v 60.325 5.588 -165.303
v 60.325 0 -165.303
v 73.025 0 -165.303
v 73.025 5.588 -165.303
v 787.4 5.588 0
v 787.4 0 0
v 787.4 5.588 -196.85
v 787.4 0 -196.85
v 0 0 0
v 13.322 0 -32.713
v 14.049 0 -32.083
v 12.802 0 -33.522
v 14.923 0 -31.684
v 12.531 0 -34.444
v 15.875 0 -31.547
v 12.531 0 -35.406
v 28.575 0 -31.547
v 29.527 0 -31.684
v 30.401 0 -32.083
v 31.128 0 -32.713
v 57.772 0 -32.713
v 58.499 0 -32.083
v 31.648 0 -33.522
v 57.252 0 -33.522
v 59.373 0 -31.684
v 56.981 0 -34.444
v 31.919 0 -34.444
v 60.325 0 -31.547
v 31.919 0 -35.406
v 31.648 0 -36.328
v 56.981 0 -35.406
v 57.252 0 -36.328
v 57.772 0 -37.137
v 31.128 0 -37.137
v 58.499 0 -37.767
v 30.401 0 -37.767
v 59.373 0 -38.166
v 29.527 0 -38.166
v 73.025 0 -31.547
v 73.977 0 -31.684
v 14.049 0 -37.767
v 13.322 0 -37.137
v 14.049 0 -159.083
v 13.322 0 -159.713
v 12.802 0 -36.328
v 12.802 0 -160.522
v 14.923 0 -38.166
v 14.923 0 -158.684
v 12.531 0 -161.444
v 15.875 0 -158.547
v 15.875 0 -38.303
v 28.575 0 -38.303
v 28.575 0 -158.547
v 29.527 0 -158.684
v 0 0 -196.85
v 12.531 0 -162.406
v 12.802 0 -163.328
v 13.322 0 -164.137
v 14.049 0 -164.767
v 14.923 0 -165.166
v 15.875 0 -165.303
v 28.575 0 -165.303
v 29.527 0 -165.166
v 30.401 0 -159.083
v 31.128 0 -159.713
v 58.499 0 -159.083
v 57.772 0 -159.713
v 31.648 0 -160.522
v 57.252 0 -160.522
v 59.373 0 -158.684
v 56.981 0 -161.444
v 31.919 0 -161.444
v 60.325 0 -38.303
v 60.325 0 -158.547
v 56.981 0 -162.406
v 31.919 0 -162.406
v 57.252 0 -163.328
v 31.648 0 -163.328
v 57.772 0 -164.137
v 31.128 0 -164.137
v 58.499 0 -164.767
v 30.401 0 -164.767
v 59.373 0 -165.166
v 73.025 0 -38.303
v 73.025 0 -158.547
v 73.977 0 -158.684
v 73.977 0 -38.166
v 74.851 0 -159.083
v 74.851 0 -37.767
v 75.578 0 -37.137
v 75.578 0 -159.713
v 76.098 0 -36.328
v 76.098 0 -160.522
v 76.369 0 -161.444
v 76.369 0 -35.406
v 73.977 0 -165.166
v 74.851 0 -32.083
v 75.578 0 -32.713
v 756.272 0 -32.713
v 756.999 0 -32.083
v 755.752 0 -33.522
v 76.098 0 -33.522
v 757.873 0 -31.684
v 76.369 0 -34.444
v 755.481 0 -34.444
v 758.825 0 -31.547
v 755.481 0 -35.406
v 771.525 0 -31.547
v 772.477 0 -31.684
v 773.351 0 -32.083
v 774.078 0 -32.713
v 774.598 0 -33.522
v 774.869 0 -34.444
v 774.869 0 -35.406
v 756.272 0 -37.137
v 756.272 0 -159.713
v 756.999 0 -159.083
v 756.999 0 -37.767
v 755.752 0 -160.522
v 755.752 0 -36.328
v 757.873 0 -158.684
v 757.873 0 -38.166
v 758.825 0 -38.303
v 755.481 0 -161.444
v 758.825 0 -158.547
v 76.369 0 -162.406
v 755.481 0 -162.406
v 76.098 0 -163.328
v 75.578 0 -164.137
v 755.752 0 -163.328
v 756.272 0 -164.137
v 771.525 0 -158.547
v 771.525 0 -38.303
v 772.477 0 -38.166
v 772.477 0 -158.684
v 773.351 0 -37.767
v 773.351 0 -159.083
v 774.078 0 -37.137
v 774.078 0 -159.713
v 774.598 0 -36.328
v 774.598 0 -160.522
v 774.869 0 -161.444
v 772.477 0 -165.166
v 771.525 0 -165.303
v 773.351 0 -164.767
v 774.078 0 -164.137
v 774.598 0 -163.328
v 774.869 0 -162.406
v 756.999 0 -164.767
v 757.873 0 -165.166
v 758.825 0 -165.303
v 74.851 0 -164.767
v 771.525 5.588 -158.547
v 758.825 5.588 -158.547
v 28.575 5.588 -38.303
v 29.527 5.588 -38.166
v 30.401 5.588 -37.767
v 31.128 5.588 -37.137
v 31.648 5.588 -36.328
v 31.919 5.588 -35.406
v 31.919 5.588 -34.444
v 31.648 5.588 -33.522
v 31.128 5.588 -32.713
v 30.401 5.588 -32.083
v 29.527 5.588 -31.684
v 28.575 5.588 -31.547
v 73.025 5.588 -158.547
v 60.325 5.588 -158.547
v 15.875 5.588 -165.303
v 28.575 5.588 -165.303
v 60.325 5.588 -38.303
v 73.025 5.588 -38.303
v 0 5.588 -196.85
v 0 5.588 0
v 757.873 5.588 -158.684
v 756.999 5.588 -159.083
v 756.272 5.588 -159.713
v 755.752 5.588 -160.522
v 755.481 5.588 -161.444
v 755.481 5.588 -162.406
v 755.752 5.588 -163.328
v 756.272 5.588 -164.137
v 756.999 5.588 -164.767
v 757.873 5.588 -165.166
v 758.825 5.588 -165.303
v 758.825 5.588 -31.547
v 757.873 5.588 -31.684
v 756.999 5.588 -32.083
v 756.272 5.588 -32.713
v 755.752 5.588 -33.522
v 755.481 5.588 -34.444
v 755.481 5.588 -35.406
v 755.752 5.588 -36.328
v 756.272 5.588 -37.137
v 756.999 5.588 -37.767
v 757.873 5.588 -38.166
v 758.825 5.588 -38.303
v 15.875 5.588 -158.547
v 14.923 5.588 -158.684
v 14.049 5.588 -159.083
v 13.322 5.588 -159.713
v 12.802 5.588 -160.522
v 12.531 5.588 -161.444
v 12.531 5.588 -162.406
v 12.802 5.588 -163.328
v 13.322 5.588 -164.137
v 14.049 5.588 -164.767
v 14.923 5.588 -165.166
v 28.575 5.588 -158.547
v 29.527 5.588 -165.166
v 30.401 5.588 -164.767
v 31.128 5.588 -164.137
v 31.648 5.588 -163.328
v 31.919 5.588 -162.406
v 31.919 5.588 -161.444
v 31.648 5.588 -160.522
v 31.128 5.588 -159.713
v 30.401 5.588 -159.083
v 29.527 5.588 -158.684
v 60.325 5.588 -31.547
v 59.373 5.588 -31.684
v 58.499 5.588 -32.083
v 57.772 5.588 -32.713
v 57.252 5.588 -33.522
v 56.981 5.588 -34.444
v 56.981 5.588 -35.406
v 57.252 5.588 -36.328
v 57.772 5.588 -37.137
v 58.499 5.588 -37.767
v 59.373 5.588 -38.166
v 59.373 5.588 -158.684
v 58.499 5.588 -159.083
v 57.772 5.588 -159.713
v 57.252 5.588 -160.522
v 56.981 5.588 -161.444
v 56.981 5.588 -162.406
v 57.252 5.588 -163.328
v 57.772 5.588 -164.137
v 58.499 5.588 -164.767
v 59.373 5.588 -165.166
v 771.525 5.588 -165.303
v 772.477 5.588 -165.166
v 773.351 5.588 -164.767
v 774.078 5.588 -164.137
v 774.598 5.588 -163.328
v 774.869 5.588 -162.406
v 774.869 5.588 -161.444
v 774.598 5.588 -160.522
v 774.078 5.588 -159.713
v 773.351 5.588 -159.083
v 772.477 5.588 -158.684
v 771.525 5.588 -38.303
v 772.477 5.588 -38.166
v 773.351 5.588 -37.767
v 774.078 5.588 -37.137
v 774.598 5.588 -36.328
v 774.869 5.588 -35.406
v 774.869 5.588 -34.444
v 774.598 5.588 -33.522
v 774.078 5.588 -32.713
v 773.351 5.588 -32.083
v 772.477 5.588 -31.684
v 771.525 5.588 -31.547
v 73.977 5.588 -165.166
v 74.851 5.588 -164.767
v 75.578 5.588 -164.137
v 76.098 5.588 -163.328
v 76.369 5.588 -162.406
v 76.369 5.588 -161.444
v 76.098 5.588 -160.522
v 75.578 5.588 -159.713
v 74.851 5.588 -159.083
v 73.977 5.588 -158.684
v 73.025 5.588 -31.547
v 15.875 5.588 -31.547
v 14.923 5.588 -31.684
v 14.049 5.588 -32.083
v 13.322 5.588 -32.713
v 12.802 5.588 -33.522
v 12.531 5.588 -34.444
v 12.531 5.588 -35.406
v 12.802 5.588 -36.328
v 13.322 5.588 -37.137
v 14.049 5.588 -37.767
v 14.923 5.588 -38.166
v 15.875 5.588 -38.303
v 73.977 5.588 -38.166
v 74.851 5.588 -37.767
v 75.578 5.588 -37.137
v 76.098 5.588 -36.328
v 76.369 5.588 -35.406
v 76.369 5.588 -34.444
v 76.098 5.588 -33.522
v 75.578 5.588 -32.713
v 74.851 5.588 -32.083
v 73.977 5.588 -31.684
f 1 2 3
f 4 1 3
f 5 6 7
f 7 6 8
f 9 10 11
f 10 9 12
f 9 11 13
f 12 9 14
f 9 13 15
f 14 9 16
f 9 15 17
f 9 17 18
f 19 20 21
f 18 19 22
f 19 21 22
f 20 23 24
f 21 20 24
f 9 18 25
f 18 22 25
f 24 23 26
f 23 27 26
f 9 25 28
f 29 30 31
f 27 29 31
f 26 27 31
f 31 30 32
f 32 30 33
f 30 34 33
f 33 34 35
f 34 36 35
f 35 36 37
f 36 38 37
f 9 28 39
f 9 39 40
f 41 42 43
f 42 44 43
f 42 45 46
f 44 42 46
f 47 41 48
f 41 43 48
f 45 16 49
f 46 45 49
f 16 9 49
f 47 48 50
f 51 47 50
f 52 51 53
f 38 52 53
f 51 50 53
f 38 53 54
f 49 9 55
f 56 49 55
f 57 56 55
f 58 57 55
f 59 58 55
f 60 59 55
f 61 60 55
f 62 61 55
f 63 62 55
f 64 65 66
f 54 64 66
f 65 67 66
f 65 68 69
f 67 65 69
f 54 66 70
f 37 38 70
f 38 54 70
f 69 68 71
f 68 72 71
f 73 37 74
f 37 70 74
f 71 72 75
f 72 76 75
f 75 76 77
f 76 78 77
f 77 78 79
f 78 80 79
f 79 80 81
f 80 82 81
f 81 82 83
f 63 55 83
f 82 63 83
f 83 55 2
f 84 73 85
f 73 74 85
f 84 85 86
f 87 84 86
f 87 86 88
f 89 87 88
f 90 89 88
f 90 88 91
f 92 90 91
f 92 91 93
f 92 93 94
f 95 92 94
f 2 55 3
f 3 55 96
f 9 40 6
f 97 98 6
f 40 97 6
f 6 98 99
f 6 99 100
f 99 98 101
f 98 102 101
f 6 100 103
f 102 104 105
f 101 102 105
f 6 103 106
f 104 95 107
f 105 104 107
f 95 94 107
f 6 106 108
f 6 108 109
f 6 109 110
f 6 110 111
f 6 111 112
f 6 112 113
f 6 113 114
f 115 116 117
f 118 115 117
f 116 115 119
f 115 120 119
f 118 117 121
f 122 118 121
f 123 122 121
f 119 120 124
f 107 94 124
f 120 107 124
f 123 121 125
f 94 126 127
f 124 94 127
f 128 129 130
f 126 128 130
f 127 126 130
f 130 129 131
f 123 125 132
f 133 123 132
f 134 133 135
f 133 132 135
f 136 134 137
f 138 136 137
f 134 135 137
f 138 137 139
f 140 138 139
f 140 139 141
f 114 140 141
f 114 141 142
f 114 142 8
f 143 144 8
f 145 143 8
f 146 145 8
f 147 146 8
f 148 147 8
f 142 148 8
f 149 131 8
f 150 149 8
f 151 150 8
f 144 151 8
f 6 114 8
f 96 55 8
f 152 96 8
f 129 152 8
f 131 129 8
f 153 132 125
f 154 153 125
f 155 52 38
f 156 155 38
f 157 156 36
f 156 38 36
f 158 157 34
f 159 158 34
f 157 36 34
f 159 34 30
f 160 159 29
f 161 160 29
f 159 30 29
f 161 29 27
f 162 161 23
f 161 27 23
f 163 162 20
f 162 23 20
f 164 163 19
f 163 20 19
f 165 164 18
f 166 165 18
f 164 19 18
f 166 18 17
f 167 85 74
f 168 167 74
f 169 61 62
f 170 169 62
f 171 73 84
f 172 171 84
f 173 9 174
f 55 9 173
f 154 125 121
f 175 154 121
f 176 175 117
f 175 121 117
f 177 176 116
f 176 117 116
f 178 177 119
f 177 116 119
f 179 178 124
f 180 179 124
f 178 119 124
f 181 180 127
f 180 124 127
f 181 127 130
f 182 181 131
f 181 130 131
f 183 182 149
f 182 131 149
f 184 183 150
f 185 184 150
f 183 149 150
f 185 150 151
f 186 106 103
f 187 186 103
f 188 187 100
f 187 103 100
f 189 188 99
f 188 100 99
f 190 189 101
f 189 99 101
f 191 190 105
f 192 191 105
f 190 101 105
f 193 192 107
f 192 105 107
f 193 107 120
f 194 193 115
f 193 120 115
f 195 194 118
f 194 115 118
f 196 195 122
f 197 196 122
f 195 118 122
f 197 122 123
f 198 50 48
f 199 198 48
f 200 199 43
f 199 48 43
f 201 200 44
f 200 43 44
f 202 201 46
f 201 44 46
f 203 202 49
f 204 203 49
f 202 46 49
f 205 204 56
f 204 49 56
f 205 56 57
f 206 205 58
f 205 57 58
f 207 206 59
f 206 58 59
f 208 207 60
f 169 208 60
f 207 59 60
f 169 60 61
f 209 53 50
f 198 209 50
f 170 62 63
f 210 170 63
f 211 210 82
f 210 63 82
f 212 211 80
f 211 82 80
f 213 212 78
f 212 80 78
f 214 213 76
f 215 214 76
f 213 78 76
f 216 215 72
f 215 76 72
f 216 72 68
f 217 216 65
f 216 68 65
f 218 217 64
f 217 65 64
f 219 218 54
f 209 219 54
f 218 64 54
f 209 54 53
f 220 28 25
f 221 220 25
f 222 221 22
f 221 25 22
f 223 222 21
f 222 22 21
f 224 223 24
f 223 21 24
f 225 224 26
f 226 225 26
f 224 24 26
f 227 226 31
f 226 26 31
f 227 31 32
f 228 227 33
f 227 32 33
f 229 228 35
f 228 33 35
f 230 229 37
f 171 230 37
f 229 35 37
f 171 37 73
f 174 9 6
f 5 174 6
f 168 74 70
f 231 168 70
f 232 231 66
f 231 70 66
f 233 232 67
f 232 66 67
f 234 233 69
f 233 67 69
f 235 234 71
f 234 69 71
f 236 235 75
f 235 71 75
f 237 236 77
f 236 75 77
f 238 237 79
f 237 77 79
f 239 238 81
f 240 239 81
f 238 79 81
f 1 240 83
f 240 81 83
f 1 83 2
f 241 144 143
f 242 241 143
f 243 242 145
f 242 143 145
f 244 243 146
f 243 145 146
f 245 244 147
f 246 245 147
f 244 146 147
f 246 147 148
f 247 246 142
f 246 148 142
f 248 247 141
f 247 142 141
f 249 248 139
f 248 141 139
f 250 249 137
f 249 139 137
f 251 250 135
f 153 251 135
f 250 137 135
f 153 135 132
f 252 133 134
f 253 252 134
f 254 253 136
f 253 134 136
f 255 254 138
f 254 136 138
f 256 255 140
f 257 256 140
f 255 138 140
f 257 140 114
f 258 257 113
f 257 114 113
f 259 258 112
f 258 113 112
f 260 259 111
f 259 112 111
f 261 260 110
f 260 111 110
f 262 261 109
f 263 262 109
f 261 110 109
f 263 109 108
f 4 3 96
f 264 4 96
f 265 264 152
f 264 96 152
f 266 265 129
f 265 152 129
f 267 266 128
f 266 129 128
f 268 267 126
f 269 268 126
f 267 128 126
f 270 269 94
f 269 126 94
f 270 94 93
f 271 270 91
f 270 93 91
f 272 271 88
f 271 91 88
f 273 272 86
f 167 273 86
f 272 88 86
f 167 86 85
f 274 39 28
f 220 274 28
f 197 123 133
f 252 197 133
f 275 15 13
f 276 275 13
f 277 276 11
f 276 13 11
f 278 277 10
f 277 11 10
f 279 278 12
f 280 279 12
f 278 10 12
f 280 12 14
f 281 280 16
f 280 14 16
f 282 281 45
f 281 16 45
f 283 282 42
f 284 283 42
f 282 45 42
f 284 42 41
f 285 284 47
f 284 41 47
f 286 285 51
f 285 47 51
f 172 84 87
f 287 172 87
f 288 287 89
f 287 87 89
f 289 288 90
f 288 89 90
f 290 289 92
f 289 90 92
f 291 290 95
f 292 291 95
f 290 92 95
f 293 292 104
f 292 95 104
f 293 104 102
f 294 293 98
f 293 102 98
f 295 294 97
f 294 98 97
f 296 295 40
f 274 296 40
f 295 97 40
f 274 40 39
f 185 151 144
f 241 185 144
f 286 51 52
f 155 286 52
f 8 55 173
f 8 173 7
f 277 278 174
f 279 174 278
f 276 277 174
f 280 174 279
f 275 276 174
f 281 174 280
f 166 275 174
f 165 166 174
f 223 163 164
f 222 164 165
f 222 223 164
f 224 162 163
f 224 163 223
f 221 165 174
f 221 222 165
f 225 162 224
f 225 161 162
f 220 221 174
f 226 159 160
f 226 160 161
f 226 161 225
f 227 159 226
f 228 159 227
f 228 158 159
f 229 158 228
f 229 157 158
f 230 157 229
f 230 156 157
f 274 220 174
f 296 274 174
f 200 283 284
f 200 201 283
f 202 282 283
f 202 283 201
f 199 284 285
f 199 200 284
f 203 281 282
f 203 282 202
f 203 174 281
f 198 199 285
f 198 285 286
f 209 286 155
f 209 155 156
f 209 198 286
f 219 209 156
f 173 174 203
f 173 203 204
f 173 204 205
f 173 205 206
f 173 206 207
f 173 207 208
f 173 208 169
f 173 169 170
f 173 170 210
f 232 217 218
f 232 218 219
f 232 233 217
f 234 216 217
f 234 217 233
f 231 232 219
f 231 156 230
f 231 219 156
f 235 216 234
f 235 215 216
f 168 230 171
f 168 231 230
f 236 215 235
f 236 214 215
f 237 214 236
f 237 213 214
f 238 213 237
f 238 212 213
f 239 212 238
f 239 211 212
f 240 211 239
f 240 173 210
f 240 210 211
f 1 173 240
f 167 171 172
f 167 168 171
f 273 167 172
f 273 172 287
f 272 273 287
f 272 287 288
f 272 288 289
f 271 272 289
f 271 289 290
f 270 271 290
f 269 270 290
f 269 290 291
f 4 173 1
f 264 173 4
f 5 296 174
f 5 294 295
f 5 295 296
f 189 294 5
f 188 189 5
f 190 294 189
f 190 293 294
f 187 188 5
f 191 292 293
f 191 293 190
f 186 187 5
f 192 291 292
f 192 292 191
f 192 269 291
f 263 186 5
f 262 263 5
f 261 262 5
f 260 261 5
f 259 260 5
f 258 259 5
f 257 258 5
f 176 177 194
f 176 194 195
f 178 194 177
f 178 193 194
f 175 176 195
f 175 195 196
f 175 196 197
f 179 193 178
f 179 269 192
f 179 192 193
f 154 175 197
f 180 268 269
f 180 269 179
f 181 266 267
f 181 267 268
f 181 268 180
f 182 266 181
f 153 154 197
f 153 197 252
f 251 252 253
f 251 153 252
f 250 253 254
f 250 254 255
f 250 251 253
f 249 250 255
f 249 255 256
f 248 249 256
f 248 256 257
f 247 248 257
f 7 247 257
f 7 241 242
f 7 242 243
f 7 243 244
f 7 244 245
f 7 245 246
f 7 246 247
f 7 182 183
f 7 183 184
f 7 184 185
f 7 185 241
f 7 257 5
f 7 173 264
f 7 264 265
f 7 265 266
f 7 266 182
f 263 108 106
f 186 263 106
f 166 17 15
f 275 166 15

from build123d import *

# Parameters (mm, degrees)
SKETCH1_W           = 787.4
SKETCH1_H           = 196.85
BOSS_EXTRUDE1_DEPTH = 5.588


with BuildPart() as part:
    # Sketch1 → Boss-Extrude1 (new body)
    with BuildSketch(Plane(origin=(0, 0, 0), x_dir=(1, 0, 0), z_dir=(0, 1, 0))):
        with Locations((393.7, 98.425)):
            Rectangle(SKETCH1_W, SKETCH1_H)
        with BuildLine():
            Line((15.875, 38.3032), (28.575, 38.3032))
            ThreePointArc((28.575, 38.3032), (31.9532, 34.925), (28.575, 31.5468))
            Line((28.575, 31.5468), (15.875, 31.5468))
            ThreePointArc((15.875, 31.5468), (12.4968, 34.925), (15.875, 38.3032))
        make_face(mode=Mode.SUBTRACT)
        with BuildLine():
            Line((15.875, 165.3032), (28.575, 165.3032))
            ThreePointArc((28.575, 165.3032), (31.9532, 161.925), (28.575, 158.5468))
            Line((28.575, 158.5468), (15.875, 158.5468))
            ThreePointArc((15.875, 158.5468), (12.4968, 161.925), (15.875, 165.3032))
        make_face(mode=Mode.SUBTRACT)
        with BuildLine():
            Line((60.325, 165.3032), (73.025, 165.3032))
            ThreePointArc((73.025, 165.3032), (76.4032, 161.925), (73.025, 158.5468))
            Line((73.025, 158.5468), (60.325, 158.5468))
            ThreePointArc((60.325, 158.5468), (56.9468, 161.925), (60.325, 165.3032))
        make_face(mode=Mode.SUBTRACT)
        with BuildLine():
            Line((60.325, 38.3032), (73.025, 38.3032))
            ThreePointArc((73.025, 38.3032), (76.4032, 34.925), (73.025, 31.5468))
            Line((73.025, 31.5468), (60.325, 31.5468))
            ThreePointArc((60.325, 31.5468), (56.9468, 34.925), (60.325, 38.3032))
        make_face(mode=Mode.SUBTRACT)
        with BuildLine():
            Line((771.525, 158.5468), (758.825, 158.5468))
            ThreePointArc((758.825, 158.5468), (755.4468, 161.925), (758.825, 165.3032))
            Line((758.825, 165.3032), (771.525, 165.3032))
            ThreePointArc((771.525, 165.3032), (774.9032, 161.925), (771.525, 158.5468))
        make_face(mode=Mode.SUBTRACT)
        with BuildLine():
            Line((771.525, 31.5468), (758.825, 31.5468))
            ThreePointArc((758.825, 31.5468), (755.4468, 34.925), (758.825, 38.3032))
            Line((758.825, 38.3032), (771.525, 38.3032))
            ThreePointArc((771.525, 38.3032), (774.9032, 34.925), (771.525, 31.5468))
        make_face(mode=Mode.SUBTRACT)
    extrude(amount=BOSS_EXTRUDE1_DEPTH)


solid = part.part
